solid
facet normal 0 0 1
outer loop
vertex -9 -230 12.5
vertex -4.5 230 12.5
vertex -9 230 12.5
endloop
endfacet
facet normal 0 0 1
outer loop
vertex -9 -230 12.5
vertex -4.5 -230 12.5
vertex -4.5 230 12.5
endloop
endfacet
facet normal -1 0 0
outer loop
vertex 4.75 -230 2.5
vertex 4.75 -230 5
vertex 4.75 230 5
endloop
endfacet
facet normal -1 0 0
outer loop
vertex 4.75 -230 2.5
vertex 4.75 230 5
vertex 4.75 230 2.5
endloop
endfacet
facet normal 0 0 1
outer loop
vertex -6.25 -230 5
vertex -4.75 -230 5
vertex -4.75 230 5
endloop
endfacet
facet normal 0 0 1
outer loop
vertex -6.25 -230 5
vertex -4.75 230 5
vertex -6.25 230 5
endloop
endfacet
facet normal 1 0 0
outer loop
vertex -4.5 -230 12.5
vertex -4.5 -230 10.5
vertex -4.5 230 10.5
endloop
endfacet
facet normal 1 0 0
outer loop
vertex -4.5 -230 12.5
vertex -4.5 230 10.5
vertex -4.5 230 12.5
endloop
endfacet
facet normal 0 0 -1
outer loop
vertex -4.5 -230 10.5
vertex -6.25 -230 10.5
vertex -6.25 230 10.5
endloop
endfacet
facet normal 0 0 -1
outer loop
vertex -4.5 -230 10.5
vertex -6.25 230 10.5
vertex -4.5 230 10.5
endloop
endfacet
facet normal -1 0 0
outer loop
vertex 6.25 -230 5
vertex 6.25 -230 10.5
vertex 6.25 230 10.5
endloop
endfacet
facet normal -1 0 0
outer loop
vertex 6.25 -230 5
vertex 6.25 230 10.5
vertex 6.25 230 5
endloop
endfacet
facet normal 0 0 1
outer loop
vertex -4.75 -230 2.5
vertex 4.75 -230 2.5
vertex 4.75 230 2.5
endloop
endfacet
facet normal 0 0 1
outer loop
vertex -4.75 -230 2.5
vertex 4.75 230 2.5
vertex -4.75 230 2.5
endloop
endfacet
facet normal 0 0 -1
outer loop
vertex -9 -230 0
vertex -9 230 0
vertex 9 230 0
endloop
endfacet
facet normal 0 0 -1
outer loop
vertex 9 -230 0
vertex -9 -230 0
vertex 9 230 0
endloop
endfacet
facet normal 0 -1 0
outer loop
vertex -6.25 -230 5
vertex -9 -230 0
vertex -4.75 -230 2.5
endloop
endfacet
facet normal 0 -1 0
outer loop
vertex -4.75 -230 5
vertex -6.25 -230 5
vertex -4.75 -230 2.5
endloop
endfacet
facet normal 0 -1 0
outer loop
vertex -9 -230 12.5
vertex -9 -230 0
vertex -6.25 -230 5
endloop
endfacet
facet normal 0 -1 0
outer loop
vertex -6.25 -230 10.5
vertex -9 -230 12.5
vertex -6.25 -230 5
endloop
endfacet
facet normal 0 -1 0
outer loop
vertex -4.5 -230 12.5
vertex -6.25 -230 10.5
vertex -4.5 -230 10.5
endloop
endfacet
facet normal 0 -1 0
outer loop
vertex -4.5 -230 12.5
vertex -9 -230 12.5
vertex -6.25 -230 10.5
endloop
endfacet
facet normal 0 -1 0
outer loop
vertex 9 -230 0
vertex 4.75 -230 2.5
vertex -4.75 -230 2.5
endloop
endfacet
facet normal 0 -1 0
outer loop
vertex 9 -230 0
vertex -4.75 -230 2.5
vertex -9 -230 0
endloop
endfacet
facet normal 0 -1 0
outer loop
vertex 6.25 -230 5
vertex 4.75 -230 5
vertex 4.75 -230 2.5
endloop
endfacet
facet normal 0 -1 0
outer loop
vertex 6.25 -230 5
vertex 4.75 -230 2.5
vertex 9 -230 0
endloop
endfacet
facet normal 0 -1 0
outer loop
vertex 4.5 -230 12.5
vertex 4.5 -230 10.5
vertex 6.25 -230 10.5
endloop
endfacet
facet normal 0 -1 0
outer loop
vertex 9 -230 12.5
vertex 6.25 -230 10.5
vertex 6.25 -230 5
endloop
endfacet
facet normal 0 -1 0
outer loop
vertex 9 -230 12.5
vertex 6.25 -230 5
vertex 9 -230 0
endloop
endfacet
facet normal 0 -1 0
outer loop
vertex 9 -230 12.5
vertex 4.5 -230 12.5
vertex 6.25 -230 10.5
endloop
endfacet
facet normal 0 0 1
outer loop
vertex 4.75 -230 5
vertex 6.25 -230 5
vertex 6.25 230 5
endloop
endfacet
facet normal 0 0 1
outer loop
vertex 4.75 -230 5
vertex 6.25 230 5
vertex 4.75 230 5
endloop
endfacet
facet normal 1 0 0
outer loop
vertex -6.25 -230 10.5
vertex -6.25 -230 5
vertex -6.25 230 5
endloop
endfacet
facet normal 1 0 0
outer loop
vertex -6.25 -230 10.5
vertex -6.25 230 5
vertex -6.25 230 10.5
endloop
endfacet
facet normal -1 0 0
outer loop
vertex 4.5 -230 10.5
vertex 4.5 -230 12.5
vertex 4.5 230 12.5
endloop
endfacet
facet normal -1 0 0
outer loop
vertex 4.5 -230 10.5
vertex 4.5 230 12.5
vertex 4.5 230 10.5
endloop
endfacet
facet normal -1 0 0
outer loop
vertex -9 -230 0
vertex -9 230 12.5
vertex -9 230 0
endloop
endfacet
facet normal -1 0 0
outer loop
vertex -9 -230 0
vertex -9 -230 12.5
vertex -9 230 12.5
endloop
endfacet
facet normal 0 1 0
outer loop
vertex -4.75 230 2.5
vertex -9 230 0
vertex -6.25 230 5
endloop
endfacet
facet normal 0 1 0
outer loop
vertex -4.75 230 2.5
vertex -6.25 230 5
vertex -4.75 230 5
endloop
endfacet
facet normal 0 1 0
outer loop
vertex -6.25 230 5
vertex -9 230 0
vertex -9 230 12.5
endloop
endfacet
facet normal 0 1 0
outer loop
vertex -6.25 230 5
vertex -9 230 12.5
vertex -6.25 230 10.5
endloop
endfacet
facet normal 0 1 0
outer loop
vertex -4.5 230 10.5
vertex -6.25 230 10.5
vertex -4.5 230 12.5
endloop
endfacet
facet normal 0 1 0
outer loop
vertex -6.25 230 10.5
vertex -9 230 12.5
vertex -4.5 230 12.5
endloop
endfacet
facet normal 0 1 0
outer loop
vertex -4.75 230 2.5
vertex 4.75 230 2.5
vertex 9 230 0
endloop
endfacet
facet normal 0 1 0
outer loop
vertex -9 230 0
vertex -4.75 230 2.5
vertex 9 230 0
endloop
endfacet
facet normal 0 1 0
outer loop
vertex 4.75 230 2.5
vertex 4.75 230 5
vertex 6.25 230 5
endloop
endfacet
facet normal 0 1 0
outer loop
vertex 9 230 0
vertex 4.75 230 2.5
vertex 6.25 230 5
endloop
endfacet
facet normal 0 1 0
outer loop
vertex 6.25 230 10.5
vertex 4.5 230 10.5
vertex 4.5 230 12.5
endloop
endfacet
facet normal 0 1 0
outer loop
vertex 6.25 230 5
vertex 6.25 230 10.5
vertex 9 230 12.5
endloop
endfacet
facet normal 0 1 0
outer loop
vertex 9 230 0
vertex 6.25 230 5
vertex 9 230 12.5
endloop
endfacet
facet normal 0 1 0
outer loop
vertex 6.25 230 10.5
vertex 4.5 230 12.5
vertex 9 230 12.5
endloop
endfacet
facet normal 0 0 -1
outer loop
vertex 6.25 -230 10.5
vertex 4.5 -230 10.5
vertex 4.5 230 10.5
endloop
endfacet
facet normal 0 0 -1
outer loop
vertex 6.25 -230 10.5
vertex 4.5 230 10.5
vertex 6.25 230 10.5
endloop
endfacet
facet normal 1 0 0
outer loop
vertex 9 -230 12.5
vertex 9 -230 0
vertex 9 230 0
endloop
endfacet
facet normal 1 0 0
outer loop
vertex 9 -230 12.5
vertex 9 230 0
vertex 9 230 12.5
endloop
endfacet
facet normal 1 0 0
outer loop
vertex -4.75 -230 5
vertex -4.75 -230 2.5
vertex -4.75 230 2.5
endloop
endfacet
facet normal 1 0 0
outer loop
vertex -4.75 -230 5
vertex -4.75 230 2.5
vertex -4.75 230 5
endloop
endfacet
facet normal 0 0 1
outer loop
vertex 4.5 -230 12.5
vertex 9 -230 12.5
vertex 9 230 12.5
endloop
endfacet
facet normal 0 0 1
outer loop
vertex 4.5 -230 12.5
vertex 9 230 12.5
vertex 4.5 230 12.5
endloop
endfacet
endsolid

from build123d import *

# Parameters (mm, degrees)
F1_DEPTH = 230


with BuildPart() as f1:
    # F0 (on Front) → F1 (new body, symmetric)
    with BuildSketch(Plane.XZ):
        Polygon((-9, 0), (0, 0), (9, 0), (9, 12.5), (4.5, 12.5), (4.5, 10.5), (6.25, 10.5), (6.25, 5), (4.75, 5), (4.75, 2.5), (0, 2.5), (-4.75, 2.5), (-4.75, 5), (-6.25, 5), (-6.25, 10.5), (-4.5, 10.5), (-4.5, 12.5), (-9, 12.5), align=None)
    extrude(amount=F1_DEPTH, both=True)


solid = f1.part
